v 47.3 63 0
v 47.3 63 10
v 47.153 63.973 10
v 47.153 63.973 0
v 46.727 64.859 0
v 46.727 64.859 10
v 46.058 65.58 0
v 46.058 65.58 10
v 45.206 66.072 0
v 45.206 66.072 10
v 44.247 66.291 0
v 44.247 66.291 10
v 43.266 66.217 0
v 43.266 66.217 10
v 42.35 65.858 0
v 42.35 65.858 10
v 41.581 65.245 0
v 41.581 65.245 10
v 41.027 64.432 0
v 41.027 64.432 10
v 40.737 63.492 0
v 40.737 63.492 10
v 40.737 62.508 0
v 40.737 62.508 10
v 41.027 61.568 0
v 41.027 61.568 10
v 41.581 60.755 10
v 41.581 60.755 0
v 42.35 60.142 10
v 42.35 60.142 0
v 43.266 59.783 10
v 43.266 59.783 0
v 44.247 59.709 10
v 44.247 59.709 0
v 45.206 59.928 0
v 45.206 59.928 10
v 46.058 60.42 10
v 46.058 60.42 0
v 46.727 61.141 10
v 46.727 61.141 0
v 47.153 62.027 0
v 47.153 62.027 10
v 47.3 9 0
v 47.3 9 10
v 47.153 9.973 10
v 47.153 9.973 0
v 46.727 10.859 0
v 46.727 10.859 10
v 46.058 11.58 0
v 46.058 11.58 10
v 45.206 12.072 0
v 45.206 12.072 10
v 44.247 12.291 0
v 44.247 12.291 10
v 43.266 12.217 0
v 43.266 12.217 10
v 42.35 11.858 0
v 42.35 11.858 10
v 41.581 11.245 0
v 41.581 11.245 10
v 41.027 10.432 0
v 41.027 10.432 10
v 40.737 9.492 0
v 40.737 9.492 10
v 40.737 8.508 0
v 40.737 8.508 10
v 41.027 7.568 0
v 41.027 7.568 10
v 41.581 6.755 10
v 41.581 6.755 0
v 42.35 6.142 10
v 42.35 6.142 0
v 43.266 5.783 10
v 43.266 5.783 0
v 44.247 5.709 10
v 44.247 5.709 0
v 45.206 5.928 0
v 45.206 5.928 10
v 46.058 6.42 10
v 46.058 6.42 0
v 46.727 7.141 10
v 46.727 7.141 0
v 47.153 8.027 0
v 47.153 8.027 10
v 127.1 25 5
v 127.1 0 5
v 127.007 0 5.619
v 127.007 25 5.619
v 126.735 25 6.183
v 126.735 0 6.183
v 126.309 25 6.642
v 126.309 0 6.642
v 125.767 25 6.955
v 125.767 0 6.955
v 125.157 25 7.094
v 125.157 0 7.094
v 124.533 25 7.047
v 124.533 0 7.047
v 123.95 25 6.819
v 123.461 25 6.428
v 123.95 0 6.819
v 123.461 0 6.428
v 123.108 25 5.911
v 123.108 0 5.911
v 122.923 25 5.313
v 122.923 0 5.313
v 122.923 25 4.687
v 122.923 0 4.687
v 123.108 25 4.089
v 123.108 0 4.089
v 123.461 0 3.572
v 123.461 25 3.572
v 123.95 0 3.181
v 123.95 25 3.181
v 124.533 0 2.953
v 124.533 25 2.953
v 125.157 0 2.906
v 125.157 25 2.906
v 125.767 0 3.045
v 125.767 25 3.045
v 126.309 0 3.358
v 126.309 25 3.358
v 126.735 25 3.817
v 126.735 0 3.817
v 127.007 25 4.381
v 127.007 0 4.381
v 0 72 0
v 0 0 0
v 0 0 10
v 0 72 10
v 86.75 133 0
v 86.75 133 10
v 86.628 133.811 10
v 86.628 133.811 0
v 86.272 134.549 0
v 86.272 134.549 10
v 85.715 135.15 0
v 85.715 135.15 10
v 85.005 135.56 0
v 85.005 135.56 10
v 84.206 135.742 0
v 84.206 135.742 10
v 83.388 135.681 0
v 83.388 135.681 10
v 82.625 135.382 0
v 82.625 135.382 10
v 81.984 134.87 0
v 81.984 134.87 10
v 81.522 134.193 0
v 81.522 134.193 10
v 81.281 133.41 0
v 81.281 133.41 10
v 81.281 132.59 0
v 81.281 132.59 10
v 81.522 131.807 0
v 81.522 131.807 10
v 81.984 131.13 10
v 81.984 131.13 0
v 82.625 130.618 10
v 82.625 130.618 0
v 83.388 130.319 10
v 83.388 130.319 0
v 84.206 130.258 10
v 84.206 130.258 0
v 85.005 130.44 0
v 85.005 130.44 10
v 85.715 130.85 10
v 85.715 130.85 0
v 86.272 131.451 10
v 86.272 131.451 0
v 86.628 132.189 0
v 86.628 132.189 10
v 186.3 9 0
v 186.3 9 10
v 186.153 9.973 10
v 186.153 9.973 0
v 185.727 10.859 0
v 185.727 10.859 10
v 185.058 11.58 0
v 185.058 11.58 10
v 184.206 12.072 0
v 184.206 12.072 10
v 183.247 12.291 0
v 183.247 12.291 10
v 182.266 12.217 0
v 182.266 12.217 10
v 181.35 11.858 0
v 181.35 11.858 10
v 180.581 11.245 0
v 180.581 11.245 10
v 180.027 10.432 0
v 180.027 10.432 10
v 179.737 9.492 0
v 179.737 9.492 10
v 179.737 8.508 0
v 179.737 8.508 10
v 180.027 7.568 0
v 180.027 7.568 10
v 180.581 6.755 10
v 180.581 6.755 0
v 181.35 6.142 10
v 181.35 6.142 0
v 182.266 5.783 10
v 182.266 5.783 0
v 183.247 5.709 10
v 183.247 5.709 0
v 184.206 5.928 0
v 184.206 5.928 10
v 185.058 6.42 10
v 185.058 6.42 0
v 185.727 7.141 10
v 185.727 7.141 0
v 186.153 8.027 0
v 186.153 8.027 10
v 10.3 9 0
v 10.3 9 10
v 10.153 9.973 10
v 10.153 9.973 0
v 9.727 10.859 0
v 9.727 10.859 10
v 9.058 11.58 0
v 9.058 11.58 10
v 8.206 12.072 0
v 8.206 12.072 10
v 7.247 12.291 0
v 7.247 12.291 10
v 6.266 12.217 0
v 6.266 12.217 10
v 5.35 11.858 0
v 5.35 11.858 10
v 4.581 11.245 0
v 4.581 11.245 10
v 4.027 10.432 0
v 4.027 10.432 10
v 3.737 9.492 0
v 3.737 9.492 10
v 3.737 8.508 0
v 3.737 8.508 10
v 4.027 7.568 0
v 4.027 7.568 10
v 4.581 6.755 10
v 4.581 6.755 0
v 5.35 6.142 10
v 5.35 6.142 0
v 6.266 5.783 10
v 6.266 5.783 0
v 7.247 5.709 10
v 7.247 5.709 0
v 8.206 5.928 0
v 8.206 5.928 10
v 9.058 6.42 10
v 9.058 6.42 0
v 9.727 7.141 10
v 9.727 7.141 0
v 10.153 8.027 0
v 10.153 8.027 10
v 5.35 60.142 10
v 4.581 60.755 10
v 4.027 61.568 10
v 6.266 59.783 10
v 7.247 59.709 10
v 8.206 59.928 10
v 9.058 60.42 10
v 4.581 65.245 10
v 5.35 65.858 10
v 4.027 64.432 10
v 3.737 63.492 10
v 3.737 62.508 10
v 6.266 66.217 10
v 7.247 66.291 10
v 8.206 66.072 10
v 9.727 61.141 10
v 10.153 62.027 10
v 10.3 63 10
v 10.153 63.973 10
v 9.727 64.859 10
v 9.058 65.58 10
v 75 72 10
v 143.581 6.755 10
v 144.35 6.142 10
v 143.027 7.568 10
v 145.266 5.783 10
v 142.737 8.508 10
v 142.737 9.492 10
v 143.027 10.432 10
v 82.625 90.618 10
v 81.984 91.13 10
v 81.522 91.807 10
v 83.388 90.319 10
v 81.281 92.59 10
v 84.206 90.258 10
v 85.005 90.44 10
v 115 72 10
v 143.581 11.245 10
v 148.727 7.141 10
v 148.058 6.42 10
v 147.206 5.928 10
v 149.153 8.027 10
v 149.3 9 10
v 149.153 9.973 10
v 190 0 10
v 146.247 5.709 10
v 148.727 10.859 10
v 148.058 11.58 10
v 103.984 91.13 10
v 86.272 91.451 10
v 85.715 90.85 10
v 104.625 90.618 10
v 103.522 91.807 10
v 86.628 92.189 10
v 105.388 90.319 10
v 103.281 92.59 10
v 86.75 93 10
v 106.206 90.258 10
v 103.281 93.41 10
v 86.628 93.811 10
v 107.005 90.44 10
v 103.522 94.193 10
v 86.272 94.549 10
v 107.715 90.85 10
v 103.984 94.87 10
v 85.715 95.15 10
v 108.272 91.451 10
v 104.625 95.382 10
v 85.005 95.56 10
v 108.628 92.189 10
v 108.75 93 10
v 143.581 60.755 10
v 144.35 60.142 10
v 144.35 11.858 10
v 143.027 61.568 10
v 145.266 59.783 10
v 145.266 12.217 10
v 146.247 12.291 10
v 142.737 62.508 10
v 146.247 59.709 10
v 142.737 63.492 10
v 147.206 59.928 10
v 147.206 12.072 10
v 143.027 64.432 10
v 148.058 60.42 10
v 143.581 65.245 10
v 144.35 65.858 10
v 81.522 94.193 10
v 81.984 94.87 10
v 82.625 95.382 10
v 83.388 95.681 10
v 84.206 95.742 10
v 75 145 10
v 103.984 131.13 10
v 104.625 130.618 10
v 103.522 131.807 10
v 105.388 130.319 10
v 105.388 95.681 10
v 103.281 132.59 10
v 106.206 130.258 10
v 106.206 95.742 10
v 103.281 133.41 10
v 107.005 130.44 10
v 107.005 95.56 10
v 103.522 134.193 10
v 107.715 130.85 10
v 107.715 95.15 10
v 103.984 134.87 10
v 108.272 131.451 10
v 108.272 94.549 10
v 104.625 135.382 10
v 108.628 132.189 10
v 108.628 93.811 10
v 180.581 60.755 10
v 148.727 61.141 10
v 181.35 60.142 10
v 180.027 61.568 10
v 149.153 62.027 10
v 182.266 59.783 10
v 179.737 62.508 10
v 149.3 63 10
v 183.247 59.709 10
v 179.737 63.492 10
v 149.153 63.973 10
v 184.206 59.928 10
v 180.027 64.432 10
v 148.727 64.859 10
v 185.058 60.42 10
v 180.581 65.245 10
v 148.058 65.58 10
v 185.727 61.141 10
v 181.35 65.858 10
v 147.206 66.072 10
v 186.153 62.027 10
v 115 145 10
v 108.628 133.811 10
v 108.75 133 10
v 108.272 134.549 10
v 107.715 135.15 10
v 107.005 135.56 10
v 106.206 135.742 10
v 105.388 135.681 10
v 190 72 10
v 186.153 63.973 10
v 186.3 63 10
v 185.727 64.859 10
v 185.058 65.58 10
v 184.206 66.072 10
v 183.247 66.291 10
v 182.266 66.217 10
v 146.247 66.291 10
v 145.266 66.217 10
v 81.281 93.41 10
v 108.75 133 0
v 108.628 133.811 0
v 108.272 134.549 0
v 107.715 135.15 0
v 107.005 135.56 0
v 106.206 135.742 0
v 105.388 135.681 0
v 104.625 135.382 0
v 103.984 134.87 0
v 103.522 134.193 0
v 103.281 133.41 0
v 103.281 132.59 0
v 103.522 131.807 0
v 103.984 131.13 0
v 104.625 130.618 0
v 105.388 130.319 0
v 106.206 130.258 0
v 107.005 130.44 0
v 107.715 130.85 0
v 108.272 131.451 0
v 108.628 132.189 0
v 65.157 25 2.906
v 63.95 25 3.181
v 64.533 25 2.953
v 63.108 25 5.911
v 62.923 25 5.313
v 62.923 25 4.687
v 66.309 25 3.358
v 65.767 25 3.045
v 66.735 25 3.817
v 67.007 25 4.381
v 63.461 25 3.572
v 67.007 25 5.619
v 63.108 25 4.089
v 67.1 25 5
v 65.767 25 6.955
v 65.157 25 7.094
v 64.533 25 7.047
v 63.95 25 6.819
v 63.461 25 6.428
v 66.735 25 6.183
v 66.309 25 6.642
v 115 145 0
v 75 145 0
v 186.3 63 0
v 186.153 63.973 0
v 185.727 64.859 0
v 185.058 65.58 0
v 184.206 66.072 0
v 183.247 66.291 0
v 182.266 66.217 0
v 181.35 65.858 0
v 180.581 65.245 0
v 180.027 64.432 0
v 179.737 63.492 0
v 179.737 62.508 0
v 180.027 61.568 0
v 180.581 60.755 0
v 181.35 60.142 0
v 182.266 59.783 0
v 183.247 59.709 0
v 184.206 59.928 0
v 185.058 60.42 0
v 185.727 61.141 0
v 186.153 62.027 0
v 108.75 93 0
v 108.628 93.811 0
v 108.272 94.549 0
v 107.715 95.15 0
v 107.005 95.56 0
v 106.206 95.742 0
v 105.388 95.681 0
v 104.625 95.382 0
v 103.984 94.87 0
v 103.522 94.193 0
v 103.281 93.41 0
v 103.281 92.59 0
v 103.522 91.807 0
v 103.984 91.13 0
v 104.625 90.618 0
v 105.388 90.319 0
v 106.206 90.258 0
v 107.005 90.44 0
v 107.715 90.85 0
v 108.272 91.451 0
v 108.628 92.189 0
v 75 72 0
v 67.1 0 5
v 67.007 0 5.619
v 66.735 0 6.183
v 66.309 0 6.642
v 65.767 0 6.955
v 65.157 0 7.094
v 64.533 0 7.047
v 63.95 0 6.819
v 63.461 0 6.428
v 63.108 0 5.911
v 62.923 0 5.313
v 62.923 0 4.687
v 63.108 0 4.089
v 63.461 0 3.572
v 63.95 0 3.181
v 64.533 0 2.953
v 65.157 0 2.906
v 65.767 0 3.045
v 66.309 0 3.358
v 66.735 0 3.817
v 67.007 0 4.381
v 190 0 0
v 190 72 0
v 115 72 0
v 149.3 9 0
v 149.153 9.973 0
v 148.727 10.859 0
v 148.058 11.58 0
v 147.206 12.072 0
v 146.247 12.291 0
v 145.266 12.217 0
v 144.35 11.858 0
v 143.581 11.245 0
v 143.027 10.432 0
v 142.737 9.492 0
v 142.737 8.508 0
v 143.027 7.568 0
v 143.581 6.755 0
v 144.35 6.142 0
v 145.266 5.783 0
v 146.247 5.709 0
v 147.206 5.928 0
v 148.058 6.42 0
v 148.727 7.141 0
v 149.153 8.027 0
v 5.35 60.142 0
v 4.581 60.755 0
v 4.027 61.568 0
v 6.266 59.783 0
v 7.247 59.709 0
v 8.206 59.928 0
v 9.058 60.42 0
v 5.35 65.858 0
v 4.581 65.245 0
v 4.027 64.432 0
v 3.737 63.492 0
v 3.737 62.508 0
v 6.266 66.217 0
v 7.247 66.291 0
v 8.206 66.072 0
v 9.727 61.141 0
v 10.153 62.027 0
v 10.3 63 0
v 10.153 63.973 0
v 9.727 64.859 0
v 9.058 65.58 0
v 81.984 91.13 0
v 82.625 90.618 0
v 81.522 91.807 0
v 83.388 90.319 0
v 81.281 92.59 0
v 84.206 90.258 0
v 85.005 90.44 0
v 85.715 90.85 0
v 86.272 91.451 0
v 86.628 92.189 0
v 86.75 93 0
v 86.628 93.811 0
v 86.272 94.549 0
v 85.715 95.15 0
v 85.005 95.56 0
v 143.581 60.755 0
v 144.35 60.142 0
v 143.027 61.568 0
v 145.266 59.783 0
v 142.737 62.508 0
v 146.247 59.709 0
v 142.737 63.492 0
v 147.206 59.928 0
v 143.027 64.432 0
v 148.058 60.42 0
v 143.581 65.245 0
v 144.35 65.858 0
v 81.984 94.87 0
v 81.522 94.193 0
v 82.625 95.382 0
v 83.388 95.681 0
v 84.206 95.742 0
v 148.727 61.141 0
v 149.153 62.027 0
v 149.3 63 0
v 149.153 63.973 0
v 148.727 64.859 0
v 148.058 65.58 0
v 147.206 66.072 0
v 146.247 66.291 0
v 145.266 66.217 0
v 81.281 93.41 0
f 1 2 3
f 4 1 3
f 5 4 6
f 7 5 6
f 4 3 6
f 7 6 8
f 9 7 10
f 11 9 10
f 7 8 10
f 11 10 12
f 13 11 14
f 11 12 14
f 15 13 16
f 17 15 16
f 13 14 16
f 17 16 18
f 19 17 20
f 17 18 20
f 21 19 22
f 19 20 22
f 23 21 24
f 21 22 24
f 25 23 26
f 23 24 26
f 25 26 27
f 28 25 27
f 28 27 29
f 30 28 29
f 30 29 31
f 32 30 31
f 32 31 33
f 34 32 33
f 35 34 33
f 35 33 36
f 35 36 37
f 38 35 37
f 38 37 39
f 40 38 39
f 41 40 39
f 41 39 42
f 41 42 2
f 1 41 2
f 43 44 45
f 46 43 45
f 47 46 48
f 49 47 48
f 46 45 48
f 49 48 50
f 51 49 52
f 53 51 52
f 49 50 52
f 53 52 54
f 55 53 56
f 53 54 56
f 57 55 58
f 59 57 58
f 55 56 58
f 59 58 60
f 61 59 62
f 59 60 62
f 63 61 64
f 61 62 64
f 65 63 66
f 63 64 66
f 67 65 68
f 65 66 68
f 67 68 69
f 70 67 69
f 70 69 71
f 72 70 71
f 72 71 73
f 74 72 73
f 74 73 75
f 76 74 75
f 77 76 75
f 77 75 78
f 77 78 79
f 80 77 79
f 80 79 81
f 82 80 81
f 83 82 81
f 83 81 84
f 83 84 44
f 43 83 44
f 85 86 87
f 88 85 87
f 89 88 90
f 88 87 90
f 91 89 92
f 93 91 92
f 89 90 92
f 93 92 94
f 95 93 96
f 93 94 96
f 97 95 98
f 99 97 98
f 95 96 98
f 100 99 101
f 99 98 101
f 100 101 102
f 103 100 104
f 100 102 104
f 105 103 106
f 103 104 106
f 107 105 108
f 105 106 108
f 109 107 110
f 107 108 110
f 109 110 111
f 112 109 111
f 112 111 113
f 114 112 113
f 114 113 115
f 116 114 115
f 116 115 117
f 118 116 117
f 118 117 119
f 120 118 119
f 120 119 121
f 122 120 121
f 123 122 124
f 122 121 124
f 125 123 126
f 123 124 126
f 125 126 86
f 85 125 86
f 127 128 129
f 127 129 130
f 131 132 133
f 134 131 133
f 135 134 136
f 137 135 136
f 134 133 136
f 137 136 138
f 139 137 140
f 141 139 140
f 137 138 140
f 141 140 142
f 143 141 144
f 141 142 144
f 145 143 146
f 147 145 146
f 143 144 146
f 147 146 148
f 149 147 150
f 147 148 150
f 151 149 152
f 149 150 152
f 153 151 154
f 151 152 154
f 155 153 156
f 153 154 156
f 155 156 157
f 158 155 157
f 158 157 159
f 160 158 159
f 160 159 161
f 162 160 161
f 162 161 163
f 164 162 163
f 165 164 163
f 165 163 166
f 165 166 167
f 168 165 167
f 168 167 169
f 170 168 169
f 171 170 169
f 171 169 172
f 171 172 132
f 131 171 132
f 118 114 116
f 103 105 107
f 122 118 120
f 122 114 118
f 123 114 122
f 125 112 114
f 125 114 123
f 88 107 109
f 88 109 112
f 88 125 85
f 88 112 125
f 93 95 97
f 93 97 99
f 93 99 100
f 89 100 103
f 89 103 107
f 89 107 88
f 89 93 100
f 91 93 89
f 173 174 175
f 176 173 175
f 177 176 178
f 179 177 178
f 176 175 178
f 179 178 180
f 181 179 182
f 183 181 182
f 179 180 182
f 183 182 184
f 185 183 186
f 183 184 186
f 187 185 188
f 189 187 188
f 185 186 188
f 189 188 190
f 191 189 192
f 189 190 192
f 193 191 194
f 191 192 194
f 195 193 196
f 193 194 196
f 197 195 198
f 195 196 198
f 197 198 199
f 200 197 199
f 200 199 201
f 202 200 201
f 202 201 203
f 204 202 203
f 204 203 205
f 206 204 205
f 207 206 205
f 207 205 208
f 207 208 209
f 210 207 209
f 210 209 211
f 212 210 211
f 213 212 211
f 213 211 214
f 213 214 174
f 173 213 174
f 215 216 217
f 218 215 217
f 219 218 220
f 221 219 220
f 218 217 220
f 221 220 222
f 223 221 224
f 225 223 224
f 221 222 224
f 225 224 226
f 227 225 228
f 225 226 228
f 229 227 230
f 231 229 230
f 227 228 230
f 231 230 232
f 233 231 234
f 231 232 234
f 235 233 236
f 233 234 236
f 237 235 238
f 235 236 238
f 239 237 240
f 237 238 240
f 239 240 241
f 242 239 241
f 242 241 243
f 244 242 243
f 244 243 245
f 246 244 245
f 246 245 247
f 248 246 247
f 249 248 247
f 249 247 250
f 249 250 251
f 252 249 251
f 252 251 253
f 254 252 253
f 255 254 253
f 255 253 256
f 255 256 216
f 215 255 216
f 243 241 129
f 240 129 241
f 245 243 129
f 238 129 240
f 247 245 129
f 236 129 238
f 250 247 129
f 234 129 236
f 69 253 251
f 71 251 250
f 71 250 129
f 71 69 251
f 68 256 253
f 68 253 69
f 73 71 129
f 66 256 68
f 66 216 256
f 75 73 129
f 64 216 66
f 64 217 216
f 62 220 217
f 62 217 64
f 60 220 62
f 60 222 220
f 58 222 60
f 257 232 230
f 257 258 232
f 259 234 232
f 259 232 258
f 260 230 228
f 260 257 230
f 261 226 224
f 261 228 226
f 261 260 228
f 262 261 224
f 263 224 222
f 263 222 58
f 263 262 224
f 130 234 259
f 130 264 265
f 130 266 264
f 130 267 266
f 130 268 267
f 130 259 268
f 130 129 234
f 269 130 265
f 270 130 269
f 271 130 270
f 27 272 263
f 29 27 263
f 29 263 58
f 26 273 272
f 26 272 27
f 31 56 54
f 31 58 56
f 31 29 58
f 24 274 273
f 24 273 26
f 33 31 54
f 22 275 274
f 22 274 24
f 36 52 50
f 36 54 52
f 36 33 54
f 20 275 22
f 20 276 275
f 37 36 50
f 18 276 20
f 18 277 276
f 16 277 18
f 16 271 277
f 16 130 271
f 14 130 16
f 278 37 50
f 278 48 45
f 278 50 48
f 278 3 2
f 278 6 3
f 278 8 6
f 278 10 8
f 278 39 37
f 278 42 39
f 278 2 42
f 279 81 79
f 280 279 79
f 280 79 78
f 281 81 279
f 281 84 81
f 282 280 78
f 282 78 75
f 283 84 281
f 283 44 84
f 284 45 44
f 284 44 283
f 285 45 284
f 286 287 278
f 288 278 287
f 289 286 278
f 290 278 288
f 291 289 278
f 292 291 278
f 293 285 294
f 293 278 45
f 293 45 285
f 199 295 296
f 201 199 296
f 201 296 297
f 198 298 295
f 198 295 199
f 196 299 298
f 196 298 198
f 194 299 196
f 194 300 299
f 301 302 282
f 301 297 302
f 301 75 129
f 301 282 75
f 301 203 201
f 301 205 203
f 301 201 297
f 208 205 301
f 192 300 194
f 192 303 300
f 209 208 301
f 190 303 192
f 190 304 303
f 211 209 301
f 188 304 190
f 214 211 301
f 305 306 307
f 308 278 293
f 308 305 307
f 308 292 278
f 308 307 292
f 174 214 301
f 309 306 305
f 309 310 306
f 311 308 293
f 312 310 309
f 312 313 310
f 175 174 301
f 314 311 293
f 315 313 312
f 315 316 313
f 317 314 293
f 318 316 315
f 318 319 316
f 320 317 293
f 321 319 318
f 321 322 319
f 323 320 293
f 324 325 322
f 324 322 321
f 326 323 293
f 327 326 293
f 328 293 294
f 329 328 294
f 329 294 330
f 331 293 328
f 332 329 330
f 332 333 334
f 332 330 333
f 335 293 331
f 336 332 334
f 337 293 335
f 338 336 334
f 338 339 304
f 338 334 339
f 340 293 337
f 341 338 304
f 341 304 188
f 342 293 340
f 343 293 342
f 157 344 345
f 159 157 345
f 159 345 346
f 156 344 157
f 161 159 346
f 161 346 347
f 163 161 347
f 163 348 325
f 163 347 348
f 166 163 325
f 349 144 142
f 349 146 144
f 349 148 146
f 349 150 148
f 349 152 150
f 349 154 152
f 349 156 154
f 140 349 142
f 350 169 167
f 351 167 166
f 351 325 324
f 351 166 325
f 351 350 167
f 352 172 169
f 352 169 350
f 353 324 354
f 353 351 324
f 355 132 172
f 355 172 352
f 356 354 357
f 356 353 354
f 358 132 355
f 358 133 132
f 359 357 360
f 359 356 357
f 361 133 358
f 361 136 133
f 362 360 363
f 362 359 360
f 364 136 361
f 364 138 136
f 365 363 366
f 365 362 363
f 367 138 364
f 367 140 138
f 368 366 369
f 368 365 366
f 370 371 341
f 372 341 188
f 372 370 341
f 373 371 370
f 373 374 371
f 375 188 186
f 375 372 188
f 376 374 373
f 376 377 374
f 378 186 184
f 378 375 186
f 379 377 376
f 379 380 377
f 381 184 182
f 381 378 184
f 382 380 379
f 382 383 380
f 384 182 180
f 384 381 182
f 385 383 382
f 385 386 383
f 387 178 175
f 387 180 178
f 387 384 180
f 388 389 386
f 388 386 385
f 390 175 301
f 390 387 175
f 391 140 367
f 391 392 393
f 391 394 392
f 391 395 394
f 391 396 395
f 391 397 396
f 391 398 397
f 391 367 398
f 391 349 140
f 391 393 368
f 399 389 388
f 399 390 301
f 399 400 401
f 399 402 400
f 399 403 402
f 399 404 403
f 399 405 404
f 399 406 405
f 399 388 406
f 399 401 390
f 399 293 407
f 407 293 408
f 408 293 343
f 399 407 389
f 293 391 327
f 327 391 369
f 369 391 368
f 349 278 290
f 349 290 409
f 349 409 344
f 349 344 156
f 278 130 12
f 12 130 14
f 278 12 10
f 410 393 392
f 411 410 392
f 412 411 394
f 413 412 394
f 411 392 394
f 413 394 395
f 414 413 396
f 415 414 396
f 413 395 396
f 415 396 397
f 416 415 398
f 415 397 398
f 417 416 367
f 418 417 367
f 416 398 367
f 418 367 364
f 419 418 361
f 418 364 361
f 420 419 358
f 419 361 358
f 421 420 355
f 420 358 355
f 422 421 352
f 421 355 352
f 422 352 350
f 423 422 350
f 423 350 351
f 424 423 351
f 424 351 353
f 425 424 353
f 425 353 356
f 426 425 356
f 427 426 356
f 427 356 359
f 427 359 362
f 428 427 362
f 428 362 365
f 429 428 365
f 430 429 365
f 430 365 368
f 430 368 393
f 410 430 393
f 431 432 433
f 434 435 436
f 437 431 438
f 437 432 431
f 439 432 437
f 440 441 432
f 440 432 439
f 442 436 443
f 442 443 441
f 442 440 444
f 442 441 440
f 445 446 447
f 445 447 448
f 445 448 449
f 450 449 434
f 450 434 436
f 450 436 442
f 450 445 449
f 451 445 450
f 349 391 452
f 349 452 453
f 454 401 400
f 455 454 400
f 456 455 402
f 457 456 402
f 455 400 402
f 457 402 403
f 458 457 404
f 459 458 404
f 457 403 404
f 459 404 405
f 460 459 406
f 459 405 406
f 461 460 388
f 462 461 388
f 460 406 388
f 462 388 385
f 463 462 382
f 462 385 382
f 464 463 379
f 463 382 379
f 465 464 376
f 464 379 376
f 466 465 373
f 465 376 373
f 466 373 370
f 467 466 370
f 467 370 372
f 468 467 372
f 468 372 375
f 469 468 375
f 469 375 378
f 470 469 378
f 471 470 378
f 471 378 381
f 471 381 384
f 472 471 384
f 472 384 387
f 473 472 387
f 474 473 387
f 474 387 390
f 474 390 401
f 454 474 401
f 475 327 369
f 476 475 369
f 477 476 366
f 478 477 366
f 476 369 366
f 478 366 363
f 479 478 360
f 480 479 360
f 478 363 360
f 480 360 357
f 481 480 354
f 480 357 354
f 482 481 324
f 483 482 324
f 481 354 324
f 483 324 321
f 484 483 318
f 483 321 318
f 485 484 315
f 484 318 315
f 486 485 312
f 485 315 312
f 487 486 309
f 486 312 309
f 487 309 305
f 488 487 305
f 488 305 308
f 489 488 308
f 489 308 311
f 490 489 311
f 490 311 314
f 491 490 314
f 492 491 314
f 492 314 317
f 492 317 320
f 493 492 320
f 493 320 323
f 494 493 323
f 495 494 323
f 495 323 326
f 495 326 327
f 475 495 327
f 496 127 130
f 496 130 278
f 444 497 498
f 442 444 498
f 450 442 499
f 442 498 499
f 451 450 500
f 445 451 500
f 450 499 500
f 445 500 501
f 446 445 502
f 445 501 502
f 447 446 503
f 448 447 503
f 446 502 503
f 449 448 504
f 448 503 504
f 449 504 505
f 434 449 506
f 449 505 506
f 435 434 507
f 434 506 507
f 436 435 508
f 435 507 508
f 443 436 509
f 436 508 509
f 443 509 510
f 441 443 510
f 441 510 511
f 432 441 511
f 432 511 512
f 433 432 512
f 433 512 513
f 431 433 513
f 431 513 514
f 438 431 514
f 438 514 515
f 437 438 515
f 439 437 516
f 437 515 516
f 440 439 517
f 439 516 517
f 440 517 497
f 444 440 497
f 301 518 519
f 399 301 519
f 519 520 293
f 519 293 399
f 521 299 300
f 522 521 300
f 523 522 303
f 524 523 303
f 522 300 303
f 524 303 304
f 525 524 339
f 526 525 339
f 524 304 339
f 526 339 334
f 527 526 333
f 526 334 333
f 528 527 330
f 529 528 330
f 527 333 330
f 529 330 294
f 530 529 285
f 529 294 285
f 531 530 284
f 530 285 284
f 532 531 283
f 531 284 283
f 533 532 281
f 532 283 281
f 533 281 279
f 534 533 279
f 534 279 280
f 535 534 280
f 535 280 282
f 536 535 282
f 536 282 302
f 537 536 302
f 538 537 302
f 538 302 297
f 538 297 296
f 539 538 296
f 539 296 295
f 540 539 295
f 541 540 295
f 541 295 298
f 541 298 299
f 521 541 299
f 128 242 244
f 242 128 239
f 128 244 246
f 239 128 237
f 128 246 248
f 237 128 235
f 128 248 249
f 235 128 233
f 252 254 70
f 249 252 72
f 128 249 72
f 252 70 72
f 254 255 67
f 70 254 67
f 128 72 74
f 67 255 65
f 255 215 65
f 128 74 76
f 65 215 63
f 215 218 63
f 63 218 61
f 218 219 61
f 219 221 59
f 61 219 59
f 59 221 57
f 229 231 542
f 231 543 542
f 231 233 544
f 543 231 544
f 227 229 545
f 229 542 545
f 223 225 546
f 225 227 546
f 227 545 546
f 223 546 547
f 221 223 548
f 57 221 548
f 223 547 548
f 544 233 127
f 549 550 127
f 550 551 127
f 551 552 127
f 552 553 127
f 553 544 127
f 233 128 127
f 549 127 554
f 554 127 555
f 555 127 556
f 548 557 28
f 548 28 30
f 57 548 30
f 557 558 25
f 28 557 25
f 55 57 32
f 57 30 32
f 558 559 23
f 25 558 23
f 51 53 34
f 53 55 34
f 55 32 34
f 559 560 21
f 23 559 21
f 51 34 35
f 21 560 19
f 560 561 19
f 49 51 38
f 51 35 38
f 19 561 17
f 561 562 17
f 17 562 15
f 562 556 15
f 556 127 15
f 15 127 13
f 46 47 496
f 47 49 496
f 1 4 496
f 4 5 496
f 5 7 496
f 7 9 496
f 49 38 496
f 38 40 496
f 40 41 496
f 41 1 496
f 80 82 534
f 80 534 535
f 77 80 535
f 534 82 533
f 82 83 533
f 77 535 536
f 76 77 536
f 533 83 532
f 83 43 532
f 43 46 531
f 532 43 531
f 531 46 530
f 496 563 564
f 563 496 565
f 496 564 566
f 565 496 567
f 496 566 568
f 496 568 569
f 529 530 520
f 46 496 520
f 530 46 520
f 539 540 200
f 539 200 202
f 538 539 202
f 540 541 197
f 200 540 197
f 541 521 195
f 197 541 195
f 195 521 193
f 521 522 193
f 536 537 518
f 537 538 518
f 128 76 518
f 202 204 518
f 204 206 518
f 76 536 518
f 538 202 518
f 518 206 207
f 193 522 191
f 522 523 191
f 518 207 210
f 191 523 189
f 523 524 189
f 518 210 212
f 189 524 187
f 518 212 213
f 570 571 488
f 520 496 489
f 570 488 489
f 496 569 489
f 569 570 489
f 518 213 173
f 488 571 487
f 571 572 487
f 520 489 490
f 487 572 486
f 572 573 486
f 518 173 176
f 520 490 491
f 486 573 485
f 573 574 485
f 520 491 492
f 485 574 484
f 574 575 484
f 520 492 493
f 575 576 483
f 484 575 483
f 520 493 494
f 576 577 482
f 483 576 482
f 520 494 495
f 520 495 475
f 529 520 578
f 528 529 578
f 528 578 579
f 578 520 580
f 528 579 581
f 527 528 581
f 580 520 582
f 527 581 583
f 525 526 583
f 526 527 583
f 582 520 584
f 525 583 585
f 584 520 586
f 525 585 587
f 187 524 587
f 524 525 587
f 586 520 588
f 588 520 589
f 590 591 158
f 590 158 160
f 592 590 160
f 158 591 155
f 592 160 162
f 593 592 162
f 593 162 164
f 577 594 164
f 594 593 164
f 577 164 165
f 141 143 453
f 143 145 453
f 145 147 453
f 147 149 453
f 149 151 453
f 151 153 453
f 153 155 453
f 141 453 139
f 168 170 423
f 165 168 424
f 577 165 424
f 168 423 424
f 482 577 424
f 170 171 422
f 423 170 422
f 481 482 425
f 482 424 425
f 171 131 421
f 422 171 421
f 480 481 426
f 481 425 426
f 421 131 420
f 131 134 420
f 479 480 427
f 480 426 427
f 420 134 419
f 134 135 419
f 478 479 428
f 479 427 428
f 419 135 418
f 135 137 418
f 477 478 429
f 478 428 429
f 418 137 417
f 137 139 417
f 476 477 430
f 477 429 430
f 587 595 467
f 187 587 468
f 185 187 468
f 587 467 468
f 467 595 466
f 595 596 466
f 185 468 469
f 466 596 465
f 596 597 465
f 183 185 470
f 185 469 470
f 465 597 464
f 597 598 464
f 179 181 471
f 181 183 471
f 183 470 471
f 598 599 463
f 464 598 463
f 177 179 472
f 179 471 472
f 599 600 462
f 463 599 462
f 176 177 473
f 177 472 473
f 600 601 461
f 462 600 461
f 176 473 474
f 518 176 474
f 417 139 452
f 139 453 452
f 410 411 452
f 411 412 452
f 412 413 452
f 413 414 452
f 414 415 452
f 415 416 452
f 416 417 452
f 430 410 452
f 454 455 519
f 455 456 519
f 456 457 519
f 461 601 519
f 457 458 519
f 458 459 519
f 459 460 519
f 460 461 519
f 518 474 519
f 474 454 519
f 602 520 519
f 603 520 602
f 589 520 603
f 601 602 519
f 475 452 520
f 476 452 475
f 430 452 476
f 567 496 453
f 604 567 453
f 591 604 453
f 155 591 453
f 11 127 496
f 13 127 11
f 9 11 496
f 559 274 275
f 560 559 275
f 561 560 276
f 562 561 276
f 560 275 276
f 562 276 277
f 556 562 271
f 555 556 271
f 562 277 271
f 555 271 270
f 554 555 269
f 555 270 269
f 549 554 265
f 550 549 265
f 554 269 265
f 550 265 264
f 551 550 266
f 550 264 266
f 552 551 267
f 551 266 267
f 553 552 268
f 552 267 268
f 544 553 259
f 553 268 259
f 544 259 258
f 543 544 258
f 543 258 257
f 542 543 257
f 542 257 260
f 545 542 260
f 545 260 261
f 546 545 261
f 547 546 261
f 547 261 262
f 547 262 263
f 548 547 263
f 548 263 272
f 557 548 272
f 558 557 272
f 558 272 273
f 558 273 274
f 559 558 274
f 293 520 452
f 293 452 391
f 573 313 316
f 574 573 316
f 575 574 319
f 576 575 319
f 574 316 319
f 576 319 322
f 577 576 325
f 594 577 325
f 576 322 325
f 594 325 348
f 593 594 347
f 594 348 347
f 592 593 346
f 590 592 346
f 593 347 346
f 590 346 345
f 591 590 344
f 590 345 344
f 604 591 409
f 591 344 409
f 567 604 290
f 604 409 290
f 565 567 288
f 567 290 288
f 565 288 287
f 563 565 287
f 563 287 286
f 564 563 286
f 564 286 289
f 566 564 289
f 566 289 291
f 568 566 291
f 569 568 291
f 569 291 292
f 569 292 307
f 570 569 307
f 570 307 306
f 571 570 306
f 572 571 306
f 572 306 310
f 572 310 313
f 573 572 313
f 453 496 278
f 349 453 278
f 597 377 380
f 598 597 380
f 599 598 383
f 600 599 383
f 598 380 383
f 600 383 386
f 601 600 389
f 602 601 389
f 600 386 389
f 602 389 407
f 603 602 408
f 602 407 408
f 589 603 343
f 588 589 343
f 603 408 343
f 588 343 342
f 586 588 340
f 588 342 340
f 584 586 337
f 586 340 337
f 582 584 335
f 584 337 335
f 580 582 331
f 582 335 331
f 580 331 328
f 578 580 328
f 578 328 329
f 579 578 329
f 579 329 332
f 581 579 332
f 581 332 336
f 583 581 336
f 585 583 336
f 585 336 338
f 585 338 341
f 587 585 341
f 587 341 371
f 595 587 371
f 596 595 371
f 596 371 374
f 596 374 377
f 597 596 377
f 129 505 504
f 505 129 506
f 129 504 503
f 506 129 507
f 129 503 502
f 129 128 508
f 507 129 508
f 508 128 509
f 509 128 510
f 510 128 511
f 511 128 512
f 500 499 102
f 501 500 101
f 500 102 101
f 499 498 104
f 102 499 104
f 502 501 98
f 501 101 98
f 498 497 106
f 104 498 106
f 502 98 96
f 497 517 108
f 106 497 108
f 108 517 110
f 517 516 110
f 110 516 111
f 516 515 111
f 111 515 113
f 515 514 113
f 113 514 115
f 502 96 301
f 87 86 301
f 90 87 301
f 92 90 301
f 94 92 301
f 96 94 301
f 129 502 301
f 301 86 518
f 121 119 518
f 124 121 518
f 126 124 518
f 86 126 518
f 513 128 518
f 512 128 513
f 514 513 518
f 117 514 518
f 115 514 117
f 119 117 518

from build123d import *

# Parameters (mm, degrees)
SKETCH_W               = 190
SKETCH_H               = 72
PAD_DEPTH              = 10
SKETCH001_W            = 40
SKETCH001_H            = 10
PAD001_DEPTH           = 73
SKETCH002_R            = 3.3
HOLE_DEPTH             = 10.001
LINEARPATTERN_COUNT    = 2
LINEARPATTERN_PITCH    = 37
LINEARPATTERN001_COUNT = 2
LINEARPATTERN001_PITCH = 139
LINEARPATTERN002_COUNT = 2
LINEARPATTERN002_PITCH = 176
SKETCH003_R            = 3.3
HOLE001_DEPTH          = 10.001
LINEARPATTERN003_COUNT = 2
LINEARPATTERN003_PITCH = 37
LINEARPATTERN004_COUNT = 2
LINEARPATTERN004_PITCH = 139
LINEARPATTERN005_COUNT = 2
LINEARPATTERN005_PITCH = 176
SKETCH004_R            = 2.75
HOLE002_DEPTH          = 10.001
LINEARPATTERN006_COUNT = 2
LINEARPATTERN006_PITCH = 22
LINEARPATTERN007_COUNT = 2
LINEARPATTERN007_PITCH = 40
SKETCH005_R            = 2.75
HOLE003_DEPTH          = 10.001
SKETCH006_R            = 2.1
HOLE004_DEPTH          = 25
LINEARPATTERN008_COUNT = 2
LINEARPATTERN008_PITCH = 60


with BuildPart() as part:
    # Sketch → Pad (new body)
    with BuildSketch(Plane.XY):
        with Locations((95, 36)):
            Rectangle(SKETCH_W, SKETCH_H)
    extrude(amount=PAD_DEPTH)

    # Sketch001 (on Face3 of Pad) → Pad001 (join)
    with BuildSketch(Plane(origin=(0, 72, 0), x_dir=(-1, 0, 0), z_dir=(0, 1, 0))):
        with Locations((-95, 5)):
            Rectangle(SKETCH001_W, SKETCH001_H)
    extrude(amount=PAD001_DEPTH)

    # Sketch002 (on Face5 of Pad001) → Hole (cut, through all)
    with BuildSketch(Plane.XY.offset(10)):
        with Locations((7, 9)):
            Circle(SKETCH002_R)
    hole = extrude(amount=-HOLE_DEPTH, mode=Mode.SUBTRACT)

    # LinearPattern: Hole ×2
    with Locations(*[(i * LINEARPATTERN_PITCH, 0, 0) for i in range(1, LINEARPATTERN_COUNT)]):
        add(hole, mode=Mode.SUBTRACT)

    # LinearPattern001: Hole ×2
    with Locations(*[(i * LINEARPATTERN001_PITCH, 0, 0) for i in range(1, LINEARPATTERN001_COUNT)]):
        add(hole, mode=Mode.SUBTRACT)

    # LinearPattern002: Hole ×2
    with Locations(*[(i * LINEARPATTERN002_PITCH, 0, 0) for i in range(1, LINEARPATTERN002_COUNT)]):
        add(hole, mode=Mode.SUBTRACT)

    # Sketch003 (on Face5 of LinearPattern002) → Hole001 (cut, through all)
    with BuildSketch(Plane.XY.offset(10)):
        with Locations((7, 63)):
            Circle(SKETCH003_R)
    hole001 = extrude(amount=-HOLE001_DEPTH, mode=Mode.SUBTRACT)

    # LinearPattern003: Hole001 ×2
    with Locations(*[(i * LINEARPATTERN003_PITCH, 0, 0) for i in range(1, LINEARPATTERN003_COUNT)]):
        add(hole001, mode=Mode.SUBTRACT)

    # LinearPattern004: Hole001 ×2
    with Locations(*[(i * LINEARPATTERN004_PITCH, 0, 0) for i in range(1, LINEARPATTERN004_COUNT)]):
        add(hole001, mode=Mode.SUBTRACT)

    # LinearPattern005: Hole001 ×2
    with Locations(*[(i * LINEARPATTERN005_PITCH, 0, 0) for i in range(1, LINEARPATTERN005_COUNT)]):
        add(hole001, mode=Mode.SUBTRACT)

    # Sketch004 (on Face17 of LinearPattern005) → Hole002 (cut, through all)
    with BuildSketch(Plane.XY.offset(10)):
        with Locations((84, 93)):
            Circle(SKETCH004_R)
    hole002 = extrude(amount=-HOLE002_DEPTH, mode=Mode.SUBTRACT)

    # LinearPattern006: Hole002 ×2
    with Locations(*[(i * LINEARPATTERN006_PITCH, 0, 0) for i in range(1, LINEARPATTERN006_COUNT)]):
        add(hole002, mode=Mode.SUBTRACT)

    # LinearPattern007: Hole002 ×2
    with Locations(*[(0, i * LINEARPATTERN007_PITCH, 0) for i in range(1, LINEARPATTERN007_COUNT)]):
        add(hole002, mode=Mode.SUBTRACT)

    # Sketch005 (on Face17 of LinearPattern007) → Hole003 (cut, through all)
    with BuildSketch(Plane.XY.offset(10)):
        with Locations((106, 133)):
            Circle(SKETCH005_R)
    extrude(amount=-HOLE003_DEPTH, mode=Mode.SUBTRACT)

    # Sketch006 (on Face1 of Hole003) → Hole004 (cut)
    with BuildSketch(Plane.XZ):
        with Locations((65, 5)):
            Circle(SKETCH006_R)
    hole004 = extrude(amount=-HOLE004_DEPTH, mode=Mode.SUBTRACT)

    # LinearPattern008: Hole004 ×2
    with Locations(*[(i * LINEARPATTERN008_PITCH, 0, 0) for i in range(1, LINEARPATTERN008_COUNT)]):
        add(hole004, mode=Mode.SUBTRACT)


solid = part.part
